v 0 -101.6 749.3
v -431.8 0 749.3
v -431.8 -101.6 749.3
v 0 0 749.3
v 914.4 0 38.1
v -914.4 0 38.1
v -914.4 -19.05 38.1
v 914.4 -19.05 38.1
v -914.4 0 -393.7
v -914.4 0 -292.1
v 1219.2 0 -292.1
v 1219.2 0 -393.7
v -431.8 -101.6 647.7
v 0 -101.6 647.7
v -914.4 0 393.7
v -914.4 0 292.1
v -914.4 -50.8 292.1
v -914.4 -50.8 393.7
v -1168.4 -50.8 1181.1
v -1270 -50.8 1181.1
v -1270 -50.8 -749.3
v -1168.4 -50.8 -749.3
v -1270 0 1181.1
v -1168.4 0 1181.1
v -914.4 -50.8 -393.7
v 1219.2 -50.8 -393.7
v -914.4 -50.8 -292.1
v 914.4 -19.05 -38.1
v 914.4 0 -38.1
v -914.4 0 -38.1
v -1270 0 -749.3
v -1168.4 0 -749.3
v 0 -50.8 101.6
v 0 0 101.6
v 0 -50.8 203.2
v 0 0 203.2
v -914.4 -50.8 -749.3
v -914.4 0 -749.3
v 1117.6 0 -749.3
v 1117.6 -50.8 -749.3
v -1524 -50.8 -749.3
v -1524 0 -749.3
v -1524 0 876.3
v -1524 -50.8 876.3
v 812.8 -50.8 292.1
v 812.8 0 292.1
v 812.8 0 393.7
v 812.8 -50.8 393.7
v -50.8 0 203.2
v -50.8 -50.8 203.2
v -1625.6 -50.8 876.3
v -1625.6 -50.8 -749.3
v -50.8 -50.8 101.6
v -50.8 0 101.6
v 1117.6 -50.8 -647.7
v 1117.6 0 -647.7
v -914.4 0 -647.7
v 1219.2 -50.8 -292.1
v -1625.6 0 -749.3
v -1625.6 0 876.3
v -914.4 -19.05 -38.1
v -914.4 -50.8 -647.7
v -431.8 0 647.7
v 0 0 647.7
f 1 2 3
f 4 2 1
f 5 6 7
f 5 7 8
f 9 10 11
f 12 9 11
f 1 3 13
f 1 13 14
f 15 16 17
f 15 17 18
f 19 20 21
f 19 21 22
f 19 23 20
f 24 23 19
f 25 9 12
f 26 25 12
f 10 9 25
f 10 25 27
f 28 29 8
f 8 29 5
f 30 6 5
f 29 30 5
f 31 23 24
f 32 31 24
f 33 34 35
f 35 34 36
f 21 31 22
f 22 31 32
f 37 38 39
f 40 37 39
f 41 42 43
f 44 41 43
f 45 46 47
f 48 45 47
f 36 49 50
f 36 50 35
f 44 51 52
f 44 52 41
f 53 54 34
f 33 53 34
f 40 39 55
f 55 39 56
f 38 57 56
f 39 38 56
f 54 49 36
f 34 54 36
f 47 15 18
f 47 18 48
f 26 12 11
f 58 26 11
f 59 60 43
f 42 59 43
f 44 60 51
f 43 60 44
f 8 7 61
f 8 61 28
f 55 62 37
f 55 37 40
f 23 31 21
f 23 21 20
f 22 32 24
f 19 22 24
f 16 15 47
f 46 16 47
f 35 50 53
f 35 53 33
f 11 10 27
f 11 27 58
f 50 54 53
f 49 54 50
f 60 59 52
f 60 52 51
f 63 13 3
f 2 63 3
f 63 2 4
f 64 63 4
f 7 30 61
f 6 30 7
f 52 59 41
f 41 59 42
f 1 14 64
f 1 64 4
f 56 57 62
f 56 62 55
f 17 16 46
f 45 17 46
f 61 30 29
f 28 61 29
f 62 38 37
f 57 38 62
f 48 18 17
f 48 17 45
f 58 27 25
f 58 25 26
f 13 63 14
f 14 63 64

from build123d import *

# Parameters (mm, degrees)
F2_W      = 1828.8
F2_H      = 76.2
F3_DEPTH  = 19.05
F4_W      = 2133.6
F4_H      = 101.6
F5_DEPTH  = 50.8
F6_W      = 2032
F6_H      = 101.6
F7_DEPTH  = 50.8
F8_W      = 1727.2
F8_H      = 101.6
F9_DEPTH  = 50.8
F10_W     = 50.8
F10_H     = 101.6
F11_DEPTH = 50.8
F12_W     = 431.8
F12_H     = 101.6
F13_DEPTH = 101.6
F14_W     = 101.6
F14_H     = 1930.4
F15_DEPTH = 50.8
F16_W     = 101.6
F16_H     = 1625.6
F17_DEPTH = 50.8


with BuildPart() as f3:
    # F2 (on Front) → F3 (new body)
    with BuildSketch(Plane.XZ):
        Rectangle(F2_W, F2_H)
    extrude(amount=F3_DEPTH)


with BuildPart() as f5:
    # F4 (on Front) → F5 (new body)
    with BuildSketch(Plane.XZ):
        with Locations((152.4, -342.9)):
            Rectangle(F4_W, F4_H)
    extrude(amount=F5_DEPTH)


with BuildPart() as f7:
    # F6 (on Front) → F7 (new body)
    with BuildSketch(Plane.XZ):
        with Locations((101.6, -698.5)):
            Rectangle(F6_W, F6_H)
    extrude(amount=F7_DEPTH)


with BuildPart() as f9:
    # F8 (on Front) → F9 (new body)
    with BuildSketch(Plane.XZ):
        with Locations((-50.8, 342.9)):
            Rectangle(F8_W, F8_H)
    extrude(amount=F9_DEPTH)


with BuildPart() as f11:
    # F10 (on Front) → F11 (new body)
    with BuildSketch(Plane.XZ):
        with Locations((-25.4, 152.4)):
            Rectangle(F10_W, F10_H)
    extrude(amount=F11_DEPTH)


with BuildPart() as f13:
    # F12 (on Front) → F13 (new body)
    with BuildSketch(Plane.XZ):
        with Locations((-215.9, 698.5)):
            Rectangle(F12_W, F12_H)
    extrude(amount=F13_DEPTH)


with BuildPart() as f15:
    # F14 (on Front) → F15 (new body)
    with BuildSketch(Plane.XZ):
        with Locations((-1219.2, 215.9)):
            Rectangle(F14_W, F14_H)
    extrude(amount=F15_DEPTH)


with BuildPart() as f17:
    # F16 (on Front) → F17 (new body)
    with BuildSketch(Plane.XZ):
        with Locations((-1574.8, 63.5)):
            Rectangle(F16_W, F16_H)
    extrude(amount=F17_DEPTH)


solid = Compound([f3.part, f5.part, f7.part, f9.part, f11.part, f13.part, f15.part, f17.part])
